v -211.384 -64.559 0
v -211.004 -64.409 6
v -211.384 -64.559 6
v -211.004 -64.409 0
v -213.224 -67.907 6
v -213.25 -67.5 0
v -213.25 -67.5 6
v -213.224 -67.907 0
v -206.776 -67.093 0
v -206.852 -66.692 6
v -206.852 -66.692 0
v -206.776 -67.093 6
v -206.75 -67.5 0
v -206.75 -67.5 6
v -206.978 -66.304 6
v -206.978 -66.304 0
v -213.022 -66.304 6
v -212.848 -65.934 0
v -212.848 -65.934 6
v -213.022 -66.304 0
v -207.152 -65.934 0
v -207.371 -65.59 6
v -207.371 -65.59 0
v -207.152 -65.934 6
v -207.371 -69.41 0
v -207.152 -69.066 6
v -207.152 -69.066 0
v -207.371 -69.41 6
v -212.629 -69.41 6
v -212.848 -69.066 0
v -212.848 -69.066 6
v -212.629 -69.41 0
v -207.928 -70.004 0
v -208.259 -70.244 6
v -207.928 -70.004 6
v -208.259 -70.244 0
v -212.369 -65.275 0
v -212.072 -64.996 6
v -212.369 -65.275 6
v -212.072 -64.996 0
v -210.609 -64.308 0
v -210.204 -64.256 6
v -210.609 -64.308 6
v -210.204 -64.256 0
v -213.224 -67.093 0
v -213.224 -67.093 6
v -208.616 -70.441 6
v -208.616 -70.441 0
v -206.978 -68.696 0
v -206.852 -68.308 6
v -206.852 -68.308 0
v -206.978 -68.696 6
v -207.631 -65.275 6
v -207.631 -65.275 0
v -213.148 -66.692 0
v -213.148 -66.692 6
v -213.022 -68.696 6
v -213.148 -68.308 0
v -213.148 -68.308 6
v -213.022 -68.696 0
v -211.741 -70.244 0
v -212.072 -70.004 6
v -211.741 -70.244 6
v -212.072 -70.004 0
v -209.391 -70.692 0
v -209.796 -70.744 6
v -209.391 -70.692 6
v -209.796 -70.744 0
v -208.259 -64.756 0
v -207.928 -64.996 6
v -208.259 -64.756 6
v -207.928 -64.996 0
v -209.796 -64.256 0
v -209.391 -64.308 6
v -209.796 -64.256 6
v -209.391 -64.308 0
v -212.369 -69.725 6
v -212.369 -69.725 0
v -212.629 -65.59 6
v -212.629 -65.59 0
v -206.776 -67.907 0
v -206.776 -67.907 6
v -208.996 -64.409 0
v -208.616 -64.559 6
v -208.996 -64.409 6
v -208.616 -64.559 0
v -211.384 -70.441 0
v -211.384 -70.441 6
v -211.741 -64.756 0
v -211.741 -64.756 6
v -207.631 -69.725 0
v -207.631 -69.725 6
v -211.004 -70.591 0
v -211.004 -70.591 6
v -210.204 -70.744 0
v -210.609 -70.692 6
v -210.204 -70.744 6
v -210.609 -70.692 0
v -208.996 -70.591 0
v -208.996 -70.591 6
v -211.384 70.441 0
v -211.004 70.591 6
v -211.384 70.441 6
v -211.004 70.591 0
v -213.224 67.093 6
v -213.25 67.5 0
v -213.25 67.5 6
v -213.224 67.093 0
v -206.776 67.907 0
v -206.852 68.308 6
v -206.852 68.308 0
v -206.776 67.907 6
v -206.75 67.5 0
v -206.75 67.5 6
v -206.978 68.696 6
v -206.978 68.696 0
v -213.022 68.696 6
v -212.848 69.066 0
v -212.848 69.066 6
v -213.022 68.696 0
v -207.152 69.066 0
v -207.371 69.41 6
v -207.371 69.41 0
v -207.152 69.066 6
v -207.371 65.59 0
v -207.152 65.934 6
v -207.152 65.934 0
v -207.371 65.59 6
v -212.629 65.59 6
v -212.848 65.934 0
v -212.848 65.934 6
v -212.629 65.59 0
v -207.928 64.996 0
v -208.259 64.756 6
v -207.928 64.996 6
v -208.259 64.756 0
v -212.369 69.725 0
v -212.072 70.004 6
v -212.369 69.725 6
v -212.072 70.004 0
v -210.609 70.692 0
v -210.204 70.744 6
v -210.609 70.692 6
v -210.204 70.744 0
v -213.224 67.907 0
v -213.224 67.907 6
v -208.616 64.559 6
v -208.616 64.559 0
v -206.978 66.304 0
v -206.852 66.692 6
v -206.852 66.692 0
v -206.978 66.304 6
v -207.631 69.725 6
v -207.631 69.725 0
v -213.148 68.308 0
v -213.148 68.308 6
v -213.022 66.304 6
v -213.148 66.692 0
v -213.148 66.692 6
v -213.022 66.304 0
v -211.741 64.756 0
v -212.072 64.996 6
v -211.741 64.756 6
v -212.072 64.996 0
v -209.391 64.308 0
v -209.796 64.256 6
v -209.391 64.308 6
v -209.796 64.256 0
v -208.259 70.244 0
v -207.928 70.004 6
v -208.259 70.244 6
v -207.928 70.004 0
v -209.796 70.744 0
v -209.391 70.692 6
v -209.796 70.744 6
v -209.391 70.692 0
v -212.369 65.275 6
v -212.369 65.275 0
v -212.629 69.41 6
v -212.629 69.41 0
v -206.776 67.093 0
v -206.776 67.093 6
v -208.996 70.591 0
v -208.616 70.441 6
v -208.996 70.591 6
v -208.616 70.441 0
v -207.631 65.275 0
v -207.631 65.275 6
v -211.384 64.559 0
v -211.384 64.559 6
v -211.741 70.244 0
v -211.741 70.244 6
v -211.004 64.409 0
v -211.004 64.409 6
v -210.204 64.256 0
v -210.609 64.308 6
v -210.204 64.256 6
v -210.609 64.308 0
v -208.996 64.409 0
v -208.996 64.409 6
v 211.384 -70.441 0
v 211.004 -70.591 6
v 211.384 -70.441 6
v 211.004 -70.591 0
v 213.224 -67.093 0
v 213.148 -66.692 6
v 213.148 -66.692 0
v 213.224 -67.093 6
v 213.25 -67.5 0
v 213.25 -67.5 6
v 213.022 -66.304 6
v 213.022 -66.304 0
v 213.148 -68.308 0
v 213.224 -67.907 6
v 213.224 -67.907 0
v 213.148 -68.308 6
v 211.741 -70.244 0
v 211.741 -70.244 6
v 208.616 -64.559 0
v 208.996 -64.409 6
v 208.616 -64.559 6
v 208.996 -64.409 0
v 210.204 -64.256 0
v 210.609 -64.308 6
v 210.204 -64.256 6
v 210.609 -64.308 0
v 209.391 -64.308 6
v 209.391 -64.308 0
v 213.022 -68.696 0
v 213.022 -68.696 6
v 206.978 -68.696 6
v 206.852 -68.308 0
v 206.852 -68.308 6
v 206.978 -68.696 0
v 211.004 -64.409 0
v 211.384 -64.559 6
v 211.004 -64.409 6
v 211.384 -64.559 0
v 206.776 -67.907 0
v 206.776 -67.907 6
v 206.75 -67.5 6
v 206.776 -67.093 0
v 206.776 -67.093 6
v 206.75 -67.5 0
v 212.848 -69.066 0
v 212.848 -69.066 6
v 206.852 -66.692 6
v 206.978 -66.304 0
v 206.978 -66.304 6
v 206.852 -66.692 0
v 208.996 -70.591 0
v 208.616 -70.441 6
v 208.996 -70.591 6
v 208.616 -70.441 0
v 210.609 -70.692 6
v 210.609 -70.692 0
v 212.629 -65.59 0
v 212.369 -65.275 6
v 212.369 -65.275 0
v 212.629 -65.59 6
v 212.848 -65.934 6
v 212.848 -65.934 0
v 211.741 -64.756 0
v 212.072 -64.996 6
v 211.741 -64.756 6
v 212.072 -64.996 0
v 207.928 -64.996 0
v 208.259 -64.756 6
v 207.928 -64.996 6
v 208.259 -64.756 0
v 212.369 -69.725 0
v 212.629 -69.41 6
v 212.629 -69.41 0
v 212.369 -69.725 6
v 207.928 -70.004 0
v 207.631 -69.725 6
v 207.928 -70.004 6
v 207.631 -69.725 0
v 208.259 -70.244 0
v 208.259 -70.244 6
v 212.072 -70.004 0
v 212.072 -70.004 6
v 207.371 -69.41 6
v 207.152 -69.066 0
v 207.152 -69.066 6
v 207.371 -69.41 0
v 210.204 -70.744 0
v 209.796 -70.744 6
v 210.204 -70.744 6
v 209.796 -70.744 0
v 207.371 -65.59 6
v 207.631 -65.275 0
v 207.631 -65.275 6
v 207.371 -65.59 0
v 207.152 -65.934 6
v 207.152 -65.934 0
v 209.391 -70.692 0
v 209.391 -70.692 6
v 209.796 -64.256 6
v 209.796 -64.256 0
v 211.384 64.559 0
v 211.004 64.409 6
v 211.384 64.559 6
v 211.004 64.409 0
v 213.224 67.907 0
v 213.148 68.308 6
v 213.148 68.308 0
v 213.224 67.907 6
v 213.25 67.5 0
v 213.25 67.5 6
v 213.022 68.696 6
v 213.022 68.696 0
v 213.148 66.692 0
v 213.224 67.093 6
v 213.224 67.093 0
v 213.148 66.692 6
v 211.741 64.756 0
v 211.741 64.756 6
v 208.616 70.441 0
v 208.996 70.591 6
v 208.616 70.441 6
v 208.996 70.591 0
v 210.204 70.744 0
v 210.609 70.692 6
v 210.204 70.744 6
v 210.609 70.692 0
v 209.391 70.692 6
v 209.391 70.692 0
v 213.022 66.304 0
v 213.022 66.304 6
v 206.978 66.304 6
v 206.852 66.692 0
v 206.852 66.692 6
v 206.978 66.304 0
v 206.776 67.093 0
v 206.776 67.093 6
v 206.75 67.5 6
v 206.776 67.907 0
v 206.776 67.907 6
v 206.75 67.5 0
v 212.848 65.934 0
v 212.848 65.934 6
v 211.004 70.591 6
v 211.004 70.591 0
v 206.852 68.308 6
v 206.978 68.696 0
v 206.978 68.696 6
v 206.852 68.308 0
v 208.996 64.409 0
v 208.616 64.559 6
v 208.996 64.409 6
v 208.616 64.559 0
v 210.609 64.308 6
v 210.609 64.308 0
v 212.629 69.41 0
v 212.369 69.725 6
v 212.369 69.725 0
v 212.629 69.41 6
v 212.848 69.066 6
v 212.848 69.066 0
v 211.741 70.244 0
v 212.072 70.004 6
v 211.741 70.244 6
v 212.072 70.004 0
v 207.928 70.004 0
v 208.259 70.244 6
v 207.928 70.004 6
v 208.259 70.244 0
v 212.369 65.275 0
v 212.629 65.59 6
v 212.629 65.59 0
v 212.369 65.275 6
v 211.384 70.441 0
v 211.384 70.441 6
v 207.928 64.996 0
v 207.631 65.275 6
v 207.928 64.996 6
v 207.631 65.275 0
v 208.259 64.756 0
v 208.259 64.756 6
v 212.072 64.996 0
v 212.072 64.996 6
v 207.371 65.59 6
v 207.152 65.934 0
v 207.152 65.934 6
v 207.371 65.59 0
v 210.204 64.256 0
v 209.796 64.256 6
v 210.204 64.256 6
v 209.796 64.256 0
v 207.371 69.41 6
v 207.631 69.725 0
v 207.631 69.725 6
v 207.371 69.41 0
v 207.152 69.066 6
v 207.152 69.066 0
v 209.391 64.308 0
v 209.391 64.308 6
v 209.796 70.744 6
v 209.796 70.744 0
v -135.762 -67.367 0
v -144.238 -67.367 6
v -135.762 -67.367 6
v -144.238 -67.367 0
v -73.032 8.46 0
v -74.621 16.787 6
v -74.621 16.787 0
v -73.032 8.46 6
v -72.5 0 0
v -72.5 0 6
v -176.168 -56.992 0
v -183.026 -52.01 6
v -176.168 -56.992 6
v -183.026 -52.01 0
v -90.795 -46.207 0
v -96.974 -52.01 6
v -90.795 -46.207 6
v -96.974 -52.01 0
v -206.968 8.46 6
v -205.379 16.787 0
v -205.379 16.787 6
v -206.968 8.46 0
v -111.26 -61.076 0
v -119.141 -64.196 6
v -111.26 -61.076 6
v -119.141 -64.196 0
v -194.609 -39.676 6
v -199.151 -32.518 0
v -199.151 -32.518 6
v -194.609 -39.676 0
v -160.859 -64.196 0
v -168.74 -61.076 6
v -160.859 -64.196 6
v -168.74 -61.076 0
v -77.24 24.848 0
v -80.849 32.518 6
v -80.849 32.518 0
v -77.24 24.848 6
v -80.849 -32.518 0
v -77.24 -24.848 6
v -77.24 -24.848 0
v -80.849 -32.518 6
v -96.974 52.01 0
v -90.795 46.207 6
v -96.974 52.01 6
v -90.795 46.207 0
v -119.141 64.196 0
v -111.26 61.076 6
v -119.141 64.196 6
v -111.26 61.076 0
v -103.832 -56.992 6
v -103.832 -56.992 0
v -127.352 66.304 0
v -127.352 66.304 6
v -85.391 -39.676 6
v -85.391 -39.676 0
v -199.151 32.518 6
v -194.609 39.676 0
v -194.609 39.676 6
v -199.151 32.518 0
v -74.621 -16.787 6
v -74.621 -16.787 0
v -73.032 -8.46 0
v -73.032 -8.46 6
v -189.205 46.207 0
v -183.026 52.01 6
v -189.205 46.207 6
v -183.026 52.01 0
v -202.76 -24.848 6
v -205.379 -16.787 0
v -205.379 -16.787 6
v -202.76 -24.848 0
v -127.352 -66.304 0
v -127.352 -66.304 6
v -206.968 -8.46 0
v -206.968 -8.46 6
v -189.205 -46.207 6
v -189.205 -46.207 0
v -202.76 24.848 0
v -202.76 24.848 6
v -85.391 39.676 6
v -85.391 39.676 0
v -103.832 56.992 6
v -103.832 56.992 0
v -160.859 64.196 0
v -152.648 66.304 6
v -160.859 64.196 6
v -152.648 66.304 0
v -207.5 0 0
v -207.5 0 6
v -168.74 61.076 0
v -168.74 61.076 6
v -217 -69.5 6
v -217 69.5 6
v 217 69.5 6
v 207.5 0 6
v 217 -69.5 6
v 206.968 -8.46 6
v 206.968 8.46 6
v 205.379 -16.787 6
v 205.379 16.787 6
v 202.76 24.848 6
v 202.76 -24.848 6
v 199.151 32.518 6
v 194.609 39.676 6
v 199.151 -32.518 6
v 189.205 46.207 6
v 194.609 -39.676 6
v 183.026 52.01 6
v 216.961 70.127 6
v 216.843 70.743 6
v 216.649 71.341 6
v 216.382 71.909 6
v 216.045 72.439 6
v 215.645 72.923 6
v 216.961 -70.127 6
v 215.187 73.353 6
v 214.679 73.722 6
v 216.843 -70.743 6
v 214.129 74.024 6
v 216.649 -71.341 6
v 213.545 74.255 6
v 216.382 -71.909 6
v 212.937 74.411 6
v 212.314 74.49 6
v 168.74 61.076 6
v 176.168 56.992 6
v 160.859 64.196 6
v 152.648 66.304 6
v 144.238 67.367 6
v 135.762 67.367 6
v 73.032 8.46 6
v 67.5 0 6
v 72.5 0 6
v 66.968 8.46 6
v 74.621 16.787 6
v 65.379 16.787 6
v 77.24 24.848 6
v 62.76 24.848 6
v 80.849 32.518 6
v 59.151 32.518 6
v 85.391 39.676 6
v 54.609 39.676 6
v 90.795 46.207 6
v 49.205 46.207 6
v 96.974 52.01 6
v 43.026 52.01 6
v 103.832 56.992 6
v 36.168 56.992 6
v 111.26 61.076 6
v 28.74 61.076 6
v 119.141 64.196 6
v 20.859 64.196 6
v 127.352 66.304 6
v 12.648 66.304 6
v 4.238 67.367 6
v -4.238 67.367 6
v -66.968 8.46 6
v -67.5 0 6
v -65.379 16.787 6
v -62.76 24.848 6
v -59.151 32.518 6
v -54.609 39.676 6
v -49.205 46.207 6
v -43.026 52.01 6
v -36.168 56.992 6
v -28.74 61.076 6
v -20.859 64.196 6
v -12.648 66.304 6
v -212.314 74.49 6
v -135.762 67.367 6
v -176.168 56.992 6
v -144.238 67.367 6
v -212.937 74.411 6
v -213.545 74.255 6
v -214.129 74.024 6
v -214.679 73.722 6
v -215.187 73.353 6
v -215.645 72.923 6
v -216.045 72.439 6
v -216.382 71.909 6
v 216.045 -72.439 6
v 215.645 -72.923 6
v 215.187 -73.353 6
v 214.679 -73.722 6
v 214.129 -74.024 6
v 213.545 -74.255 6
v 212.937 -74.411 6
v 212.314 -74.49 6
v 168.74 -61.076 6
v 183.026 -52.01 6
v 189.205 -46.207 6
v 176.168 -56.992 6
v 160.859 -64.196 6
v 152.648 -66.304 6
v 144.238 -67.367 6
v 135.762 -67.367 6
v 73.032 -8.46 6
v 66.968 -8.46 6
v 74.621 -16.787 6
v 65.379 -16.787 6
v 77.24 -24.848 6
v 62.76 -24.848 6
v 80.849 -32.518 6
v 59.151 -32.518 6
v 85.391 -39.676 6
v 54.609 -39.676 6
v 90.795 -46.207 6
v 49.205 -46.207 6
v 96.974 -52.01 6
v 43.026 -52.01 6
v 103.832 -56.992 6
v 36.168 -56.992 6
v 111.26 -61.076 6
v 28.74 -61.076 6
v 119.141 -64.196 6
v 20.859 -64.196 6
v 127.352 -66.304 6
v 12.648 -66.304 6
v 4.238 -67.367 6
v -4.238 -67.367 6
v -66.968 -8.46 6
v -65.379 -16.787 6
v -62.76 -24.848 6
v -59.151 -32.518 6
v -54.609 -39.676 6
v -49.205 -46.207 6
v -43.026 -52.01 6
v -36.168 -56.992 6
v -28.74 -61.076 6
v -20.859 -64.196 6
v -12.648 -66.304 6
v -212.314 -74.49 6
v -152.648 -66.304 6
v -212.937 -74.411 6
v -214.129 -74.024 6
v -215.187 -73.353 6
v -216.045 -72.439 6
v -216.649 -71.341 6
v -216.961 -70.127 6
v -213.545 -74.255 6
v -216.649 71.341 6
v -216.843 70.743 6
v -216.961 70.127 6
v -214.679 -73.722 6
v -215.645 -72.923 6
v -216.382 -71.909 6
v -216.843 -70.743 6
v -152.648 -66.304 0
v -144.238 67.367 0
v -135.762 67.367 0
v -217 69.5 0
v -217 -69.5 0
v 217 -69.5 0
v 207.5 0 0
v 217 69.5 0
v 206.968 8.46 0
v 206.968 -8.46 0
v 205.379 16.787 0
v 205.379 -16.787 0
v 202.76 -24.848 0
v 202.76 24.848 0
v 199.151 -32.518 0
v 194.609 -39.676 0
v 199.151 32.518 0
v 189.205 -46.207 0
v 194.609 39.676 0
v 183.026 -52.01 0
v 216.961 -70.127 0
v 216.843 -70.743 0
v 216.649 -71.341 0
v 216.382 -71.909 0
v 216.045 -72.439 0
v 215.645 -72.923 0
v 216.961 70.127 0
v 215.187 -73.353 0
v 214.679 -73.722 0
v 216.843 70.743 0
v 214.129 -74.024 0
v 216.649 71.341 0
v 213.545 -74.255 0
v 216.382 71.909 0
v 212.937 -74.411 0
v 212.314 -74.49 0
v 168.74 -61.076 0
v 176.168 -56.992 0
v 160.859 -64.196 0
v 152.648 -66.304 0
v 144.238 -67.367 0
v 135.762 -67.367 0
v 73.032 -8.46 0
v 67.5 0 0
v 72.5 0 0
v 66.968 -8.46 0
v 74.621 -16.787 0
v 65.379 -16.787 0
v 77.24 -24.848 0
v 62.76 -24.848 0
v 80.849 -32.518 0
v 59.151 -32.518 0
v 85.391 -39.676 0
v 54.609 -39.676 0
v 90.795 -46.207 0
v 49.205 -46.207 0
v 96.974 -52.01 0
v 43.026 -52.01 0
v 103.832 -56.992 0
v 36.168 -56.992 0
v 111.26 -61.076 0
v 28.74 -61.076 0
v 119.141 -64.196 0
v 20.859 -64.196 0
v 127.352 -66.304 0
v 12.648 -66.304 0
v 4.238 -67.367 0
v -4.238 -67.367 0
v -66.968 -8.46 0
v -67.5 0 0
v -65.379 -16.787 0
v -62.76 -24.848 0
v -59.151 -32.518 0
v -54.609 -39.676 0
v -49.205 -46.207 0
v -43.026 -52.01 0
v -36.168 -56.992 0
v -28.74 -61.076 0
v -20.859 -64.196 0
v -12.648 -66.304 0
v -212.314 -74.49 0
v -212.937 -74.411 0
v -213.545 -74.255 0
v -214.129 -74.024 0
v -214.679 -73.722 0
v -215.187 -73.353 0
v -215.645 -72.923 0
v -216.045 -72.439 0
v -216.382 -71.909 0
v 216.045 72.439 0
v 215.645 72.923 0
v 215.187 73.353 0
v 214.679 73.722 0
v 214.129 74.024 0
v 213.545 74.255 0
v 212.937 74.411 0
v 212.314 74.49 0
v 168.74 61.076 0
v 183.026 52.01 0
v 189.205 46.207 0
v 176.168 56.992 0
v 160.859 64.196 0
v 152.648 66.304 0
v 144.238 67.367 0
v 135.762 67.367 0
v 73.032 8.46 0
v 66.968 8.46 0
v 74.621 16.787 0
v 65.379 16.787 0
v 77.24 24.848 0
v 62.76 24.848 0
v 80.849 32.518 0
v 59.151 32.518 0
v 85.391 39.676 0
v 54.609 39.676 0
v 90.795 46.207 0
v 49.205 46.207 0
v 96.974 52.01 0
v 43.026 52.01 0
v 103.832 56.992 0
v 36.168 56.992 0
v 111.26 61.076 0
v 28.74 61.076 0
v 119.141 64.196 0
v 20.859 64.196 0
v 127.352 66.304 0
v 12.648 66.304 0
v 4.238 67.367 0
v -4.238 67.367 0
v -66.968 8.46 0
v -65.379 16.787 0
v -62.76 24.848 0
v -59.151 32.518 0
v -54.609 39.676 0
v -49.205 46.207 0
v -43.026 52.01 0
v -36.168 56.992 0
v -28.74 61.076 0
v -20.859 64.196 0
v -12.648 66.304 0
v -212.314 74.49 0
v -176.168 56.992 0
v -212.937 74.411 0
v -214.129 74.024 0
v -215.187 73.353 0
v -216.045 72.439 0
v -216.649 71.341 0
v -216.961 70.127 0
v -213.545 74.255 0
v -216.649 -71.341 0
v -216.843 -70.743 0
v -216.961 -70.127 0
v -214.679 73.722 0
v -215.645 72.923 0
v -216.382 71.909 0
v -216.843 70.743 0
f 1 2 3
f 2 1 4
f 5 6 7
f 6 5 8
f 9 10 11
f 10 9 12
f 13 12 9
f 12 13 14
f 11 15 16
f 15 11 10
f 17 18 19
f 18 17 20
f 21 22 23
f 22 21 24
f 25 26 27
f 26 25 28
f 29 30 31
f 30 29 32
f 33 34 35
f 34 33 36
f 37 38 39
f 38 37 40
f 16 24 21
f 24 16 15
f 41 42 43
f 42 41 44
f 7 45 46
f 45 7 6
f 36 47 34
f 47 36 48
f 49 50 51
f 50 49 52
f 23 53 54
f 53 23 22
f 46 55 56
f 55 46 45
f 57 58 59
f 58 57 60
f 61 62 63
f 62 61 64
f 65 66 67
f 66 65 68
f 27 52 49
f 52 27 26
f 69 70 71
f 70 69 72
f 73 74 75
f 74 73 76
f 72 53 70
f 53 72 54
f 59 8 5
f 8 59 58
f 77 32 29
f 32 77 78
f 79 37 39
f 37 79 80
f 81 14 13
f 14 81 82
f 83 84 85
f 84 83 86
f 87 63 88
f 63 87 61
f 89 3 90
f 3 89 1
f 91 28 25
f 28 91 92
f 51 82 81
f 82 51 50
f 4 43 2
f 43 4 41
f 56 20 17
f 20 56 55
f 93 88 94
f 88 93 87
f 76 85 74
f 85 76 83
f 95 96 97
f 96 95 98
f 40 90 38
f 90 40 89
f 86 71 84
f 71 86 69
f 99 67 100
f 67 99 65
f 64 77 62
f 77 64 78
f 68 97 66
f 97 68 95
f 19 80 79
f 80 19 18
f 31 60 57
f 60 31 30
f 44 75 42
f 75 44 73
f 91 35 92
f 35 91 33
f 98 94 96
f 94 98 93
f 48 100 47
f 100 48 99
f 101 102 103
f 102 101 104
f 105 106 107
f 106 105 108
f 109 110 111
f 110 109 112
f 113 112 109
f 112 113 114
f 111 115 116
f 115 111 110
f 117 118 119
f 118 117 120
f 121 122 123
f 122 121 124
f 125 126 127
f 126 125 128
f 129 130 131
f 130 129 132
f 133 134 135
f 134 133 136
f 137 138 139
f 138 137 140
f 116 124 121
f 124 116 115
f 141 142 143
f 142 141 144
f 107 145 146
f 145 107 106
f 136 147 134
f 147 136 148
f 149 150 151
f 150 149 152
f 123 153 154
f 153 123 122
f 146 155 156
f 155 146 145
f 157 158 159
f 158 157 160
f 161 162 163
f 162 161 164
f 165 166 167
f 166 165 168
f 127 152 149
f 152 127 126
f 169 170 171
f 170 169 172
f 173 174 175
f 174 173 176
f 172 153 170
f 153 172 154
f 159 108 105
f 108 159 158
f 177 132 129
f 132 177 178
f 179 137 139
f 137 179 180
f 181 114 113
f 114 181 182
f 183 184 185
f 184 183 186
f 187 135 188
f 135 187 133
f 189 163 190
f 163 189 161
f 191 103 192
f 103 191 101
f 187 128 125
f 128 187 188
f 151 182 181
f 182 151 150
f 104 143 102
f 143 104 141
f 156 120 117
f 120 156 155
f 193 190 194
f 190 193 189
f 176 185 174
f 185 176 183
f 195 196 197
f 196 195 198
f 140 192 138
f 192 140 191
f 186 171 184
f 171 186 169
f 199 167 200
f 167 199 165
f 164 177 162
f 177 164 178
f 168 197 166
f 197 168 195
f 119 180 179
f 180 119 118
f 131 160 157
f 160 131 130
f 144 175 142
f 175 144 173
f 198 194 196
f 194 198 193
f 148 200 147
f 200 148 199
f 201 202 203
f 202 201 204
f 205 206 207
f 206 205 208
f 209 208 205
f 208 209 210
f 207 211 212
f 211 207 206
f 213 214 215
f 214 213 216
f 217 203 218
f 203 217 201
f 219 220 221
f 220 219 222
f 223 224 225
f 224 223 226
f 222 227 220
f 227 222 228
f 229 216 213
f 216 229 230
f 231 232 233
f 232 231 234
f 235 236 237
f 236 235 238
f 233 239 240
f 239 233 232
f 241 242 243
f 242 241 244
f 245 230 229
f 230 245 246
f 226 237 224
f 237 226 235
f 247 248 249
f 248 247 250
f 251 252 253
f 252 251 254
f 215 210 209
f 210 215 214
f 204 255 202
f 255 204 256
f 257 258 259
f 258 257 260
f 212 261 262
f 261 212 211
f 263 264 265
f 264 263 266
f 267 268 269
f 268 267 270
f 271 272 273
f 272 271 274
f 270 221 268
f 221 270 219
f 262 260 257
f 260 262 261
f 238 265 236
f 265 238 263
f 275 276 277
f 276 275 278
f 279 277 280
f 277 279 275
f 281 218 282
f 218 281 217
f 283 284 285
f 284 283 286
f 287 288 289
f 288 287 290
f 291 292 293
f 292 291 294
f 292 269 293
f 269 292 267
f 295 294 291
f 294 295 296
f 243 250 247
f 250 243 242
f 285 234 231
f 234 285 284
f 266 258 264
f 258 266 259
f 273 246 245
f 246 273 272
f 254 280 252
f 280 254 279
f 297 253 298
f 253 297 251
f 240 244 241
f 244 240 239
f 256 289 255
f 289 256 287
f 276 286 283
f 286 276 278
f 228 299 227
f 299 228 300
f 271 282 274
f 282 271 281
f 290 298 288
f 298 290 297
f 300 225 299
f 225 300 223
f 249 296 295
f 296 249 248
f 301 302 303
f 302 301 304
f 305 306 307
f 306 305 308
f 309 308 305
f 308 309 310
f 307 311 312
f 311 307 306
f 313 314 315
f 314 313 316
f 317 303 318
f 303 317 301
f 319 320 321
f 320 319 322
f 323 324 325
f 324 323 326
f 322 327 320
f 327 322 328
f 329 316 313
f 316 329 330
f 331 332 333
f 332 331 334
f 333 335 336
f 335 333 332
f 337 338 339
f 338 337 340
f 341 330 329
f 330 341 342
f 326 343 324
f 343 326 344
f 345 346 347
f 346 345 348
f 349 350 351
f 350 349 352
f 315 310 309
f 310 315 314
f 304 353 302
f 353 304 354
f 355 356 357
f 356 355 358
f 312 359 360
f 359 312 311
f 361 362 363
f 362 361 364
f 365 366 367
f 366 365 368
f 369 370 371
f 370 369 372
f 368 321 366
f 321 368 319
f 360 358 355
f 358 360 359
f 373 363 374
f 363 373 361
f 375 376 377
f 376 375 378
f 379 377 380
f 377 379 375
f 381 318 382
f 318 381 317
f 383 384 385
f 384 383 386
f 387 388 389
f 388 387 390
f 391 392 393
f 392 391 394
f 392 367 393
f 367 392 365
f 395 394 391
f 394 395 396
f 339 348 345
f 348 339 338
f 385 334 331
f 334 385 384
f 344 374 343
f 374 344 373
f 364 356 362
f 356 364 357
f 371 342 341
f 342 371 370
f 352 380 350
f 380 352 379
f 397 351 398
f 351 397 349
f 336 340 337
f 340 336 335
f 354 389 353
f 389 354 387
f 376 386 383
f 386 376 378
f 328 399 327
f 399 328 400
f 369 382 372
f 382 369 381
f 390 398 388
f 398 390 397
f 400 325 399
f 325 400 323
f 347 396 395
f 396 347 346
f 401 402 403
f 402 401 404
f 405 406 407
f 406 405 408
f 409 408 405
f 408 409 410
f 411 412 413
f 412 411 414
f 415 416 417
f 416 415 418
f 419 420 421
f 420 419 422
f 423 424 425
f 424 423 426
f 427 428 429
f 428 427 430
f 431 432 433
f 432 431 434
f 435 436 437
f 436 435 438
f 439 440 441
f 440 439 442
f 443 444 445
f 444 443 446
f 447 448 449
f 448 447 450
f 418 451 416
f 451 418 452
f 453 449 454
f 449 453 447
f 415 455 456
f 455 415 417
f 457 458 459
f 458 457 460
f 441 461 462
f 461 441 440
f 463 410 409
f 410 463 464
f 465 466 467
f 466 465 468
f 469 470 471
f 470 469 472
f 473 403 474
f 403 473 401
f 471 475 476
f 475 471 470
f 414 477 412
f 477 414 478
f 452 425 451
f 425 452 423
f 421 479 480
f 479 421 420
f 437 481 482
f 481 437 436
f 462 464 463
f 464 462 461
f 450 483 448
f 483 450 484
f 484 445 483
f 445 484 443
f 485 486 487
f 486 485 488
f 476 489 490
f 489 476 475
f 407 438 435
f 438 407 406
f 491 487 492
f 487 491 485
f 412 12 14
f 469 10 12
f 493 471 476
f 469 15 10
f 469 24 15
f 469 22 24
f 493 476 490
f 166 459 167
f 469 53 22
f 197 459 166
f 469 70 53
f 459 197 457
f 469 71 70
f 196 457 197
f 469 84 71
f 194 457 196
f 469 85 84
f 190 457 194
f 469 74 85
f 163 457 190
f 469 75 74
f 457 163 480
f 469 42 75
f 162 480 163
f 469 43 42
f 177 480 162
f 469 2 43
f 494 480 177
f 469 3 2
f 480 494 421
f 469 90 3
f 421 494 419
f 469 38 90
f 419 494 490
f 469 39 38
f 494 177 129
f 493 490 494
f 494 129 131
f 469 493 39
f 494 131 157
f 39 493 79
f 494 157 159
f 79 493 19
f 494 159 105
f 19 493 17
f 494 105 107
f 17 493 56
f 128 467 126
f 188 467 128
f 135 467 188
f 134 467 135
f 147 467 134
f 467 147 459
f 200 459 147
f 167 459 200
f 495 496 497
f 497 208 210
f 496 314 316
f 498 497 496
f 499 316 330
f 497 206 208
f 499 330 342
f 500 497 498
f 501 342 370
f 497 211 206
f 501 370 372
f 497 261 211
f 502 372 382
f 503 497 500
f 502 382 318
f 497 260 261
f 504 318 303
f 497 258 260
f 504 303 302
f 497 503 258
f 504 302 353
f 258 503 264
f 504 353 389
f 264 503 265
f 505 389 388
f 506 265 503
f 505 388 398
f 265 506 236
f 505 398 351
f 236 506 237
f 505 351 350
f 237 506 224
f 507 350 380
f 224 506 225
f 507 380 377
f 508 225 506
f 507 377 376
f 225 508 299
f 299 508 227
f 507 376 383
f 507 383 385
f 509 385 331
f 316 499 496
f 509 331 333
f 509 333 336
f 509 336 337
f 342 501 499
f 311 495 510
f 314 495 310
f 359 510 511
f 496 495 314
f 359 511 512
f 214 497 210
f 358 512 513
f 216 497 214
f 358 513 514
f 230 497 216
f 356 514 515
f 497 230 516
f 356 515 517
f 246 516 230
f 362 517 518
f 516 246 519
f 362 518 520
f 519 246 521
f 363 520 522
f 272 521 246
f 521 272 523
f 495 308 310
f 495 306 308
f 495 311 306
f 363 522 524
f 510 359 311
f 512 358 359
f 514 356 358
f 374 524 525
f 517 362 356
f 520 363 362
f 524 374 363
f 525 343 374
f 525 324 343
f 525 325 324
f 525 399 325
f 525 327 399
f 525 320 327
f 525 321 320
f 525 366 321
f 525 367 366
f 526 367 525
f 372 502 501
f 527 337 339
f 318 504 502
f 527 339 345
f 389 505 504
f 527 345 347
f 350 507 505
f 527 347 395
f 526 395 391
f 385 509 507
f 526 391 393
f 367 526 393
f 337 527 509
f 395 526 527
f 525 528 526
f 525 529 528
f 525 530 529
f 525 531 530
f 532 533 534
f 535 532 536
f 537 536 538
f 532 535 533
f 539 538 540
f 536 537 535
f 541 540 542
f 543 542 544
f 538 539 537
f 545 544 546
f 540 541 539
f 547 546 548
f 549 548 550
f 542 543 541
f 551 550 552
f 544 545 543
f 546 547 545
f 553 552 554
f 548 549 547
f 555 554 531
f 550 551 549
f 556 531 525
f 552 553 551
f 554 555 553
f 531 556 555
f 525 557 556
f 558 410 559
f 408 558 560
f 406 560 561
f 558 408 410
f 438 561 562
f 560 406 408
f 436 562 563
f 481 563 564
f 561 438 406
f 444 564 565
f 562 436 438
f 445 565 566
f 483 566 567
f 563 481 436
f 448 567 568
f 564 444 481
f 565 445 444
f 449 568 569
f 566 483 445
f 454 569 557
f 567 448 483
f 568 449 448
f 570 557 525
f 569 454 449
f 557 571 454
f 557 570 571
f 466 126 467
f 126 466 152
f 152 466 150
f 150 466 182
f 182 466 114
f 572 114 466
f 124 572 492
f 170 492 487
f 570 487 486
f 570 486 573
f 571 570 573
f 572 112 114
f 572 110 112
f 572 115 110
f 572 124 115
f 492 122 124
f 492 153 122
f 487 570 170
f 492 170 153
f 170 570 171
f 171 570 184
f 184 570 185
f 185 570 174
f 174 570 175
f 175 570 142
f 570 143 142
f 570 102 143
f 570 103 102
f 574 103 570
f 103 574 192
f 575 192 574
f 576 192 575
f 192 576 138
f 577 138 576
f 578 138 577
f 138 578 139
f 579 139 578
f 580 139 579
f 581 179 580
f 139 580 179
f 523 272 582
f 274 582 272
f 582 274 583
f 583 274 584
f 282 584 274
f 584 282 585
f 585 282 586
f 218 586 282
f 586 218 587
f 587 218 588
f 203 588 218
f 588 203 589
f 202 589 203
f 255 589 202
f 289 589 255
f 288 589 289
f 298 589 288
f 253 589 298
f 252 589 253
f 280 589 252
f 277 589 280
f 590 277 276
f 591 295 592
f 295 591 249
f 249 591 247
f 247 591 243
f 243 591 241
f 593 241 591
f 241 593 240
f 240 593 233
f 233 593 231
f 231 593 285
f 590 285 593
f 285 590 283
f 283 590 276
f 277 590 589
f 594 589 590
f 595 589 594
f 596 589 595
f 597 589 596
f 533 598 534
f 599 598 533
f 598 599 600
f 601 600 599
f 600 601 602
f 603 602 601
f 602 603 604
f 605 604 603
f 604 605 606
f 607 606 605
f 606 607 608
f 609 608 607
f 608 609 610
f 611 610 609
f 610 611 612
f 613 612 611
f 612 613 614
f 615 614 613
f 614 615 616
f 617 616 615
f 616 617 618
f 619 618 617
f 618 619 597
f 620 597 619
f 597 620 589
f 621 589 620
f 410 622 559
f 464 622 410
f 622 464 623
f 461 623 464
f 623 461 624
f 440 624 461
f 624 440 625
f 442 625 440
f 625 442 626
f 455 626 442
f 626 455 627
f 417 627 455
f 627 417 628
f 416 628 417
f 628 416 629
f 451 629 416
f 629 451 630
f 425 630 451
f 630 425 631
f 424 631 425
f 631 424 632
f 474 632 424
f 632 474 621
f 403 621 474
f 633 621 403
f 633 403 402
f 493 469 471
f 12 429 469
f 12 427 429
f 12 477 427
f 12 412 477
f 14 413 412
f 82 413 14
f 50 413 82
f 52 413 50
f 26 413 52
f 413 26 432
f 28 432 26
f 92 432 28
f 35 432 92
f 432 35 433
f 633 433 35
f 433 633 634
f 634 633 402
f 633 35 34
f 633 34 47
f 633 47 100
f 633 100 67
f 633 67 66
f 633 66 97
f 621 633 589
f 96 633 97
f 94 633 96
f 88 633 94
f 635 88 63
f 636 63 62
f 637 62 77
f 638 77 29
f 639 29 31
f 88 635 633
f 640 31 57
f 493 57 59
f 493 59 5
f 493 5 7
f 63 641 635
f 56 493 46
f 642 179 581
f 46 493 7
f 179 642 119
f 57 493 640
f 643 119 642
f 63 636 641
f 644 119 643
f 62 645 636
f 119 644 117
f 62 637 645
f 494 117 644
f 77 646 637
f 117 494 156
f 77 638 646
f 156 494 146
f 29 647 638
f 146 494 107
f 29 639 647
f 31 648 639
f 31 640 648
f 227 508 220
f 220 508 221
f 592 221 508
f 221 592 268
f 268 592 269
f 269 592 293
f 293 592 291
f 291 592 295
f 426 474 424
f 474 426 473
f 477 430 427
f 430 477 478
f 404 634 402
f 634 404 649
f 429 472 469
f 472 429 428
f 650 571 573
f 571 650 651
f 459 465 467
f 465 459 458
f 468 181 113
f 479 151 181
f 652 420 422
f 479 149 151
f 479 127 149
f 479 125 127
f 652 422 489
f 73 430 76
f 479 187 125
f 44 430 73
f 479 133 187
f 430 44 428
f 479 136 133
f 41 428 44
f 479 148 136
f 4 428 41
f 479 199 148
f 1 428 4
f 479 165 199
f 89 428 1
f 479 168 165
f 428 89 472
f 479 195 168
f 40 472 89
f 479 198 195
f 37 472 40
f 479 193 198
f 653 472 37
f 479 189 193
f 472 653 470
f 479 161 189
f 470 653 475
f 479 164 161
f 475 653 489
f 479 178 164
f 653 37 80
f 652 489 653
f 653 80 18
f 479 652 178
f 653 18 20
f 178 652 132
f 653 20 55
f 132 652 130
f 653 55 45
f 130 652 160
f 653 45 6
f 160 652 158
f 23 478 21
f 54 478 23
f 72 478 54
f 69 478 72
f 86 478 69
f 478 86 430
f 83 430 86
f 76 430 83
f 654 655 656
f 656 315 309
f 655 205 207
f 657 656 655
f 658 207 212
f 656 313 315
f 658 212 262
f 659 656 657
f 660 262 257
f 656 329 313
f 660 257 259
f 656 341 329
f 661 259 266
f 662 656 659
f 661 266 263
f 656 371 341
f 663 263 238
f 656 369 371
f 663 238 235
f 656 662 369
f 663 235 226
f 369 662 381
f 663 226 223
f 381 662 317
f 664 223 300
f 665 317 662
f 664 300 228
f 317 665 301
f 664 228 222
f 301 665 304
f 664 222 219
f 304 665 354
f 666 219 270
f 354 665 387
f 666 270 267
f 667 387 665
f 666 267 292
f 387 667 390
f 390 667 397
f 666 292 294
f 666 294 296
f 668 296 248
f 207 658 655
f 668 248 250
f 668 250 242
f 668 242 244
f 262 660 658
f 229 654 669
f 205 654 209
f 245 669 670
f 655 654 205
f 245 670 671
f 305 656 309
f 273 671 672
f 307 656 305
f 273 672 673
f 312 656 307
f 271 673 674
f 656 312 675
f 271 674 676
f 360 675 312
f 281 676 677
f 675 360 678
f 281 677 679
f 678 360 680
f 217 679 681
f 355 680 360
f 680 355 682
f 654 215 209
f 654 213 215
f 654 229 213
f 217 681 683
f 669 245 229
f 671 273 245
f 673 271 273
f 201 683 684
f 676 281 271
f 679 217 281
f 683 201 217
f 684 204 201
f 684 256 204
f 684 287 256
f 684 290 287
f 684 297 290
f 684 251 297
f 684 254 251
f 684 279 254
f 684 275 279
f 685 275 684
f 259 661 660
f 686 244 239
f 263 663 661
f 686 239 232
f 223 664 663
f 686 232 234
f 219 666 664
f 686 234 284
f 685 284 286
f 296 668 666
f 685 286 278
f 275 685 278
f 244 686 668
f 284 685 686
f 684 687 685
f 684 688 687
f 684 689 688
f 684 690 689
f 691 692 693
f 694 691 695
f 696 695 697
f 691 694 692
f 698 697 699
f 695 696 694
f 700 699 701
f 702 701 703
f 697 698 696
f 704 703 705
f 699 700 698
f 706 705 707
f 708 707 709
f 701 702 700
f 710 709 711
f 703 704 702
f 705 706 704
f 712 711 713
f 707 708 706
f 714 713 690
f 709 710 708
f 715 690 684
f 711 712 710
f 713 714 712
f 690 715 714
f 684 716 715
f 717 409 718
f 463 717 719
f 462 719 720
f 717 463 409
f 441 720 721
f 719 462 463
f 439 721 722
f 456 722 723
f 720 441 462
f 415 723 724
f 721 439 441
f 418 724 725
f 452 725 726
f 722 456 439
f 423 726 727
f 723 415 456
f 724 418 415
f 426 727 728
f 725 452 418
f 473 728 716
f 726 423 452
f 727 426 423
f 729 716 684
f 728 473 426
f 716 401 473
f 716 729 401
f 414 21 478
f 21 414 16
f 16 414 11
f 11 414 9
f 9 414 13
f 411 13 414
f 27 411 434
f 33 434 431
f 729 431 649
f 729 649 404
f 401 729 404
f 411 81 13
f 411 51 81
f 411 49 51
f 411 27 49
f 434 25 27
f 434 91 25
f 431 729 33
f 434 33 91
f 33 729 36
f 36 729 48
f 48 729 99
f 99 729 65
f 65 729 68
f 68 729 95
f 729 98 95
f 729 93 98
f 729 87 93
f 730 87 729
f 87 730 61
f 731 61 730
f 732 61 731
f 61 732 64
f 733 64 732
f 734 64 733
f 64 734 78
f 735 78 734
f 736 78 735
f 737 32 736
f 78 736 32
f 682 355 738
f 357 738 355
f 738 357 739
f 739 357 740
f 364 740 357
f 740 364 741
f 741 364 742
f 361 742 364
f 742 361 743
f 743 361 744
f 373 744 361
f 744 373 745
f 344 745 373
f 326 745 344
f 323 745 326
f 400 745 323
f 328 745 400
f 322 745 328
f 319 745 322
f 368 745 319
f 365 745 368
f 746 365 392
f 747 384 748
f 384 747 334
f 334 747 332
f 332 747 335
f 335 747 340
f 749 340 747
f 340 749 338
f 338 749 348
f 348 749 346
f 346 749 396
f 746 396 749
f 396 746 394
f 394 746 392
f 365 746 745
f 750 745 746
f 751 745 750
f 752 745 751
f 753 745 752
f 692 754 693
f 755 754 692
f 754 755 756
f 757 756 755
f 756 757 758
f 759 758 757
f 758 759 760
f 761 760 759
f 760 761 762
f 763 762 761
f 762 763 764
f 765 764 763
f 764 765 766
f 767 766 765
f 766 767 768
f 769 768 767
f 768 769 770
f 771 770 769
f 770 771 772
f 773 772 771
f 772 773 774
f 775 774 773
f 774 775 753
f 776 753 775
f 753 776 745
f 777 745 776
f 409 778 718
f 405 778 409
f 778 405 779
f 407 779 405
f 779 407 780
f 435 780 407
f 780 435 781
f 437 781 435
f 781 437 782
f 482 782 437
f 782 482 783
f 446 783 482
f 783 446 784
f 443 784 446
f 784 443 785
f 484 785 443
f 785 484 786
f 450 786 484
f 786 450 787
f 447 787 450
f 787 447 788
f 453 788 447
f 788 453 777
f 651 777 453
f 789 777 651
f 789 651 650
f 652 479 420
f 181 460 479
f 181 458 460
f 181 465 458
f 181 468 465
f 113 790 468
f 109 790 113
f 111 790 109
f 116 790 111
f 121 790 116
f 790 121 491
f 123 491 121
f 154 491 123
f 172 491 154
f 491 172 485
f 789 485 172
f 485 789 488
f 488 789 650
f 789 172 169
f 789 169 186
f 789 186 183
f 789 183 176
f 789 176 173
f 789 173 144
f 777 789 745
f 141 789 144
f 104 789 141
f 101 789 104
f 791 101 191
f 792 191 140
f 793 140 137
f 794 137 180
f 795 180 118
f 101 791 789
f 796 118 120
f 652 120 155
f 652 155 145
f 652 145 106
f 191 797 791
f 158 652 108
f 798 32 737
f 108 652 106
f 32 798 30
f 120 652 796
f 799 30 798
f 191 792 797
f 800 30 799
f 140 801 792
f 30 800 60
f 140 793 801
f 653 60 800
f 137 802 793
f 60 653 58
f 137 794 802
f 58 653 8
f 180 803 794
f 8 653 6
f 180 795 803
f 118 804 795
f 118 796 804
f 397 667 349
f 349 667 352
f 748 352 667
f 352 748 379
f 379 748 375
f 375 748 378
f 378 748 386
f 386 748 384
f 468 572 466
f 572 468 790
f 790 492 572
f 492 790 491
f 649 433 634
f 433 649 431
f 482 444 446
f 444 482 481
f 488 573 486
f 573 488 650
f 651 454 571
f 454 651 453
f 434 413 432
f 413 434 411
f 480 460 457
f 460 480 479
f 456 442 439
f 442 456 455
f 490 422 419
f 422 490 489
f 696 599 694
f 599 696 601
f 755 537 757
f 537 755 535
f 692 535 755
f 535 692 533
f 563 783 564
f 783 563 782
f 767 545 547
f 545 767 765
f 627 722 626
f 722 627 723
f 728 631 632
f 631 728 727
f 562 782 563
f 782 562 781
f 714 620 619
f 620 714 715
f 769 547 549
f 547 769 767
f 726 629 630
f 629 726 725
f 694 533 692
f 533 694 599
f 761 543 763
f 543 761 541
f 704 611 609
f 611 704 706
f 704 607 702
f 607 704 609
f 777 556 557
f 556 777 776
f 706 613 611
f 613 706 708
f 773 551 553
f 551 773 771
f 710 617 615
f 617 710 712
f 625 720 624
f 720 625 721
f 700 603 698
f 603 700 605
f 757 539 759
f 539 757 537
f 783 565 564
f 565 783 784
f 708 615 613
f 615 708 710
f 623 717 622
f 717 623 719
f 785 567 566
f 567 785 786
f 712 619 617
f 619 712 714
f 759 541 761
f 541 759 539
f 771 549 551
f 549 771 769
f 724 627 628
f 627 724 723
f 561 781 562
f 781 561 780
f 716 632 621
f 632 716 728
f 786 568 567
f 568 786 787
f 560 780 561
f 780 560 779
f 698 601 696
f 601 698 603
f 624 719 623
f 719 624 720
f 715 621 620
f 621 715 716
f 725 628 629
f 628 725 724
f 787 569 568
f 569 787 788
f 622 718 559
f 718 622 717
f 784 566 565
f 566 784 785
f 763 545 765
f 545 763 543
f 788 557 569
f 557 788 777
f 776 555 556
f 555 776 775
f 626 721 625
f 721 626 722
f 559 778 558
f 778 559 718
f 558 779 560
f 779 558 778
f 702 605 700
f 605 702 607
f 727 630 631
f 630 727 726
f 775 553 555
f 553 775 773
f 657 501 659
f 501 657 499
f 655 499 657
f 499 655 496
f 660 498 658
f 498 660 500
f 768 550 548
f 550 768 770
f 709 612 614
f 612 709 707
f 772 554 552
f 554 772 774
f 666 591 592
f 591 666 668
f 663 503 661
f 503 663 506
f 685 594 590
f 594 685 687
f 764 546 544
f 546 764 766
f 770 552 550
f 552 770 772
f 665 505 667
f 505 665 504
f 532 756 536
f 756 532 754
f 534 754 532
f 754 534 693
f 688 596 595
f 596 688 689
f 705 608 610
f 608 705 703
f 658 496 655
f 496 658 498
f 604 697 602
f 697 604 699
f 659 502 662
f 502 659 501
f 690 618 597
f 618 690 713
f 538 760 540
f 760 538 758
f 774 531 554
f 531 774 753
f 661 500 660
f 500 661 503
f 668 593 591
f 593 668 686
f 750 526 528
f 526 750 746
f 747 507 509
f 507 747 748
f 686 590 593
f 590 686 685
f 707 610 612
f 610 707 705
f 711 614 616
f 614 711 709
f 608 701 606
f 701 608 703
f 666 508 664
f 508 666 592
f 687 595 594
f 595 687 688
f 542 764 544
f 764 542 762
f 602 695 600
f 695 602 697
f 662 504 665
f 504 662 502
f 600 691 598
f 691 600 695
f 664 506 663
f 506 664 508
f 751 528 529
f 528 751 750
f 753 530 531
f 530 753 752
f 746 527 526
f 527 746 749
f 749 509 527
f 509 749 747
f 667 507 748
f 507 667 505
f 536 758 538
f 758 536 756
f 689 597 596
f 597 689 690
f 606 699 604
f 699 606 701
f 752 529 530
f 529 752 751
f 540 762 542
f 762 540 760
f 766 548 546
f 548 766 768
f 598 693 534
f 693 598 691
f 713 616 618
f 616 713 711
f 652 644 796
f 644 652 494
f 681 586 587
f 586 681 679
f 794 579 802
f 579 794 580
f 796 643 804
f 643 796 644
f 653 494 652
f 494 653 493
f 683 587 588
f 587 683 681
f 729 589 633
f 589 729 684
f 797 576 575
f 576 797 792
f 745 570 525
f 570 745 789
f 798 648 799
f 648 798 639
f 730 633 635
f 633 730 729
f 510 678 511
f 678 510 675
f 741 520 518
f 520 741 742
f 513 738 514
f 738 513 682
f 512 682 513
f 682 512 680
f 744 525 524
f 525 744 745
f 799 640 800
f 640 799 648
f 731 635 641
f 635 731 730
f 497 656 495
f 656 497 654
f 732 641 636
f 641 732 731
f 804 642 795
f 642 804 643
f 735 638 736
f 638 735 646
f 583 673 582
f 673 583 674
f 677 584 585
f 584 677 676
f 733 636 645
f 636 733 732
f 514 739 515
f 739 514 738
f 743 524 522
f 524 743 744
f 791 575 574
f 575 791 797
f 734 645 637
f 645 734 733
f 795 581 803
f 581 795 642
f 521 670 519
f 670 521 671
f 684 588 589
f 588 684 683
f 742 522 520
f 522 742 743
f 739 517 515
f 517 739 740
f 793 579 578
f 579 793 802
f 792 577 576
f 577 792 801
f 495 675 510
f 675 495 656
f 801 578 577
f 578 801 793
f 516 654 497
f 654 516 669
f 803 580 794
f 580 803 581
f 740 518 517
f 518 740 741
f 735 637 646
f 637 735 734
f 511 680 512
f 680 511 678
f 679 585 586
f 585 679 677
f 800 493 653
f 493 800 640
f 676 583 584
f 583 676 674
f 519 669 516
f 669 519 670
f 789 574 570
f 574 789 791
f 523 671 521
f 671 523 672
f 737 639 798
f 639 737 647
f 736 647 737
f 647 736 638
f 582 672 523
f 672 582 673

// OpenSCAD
$fn = 50;


difference() {
	union() {
		hull() {
			translate(v = [-212.0000000000, 69.5000000000, 0]) {
				cylinder(h = 6, r = 5);
			}
			translate(v = [212.0000000000, 69.5000000000, 0]) {
				cylinder(h = 6, r = 5);
			}
			translate(v = [-212.0000000000, -69.5000000000, 0]) {
				cylinder(h = 6, r = 5);
			}
			translate(v = [212.0000000000, -69.5000000000, 0]) {
				cylinder(h = 6, r = 5);
			}
		}
	}
	union() {
		#translate(v = [-210.0000000000, -67.5000000000, -100.0000000000]) {
			cylinder(h = 200, r = 3.2500000000);
		}
		#translate(v = [-210.0000000000, 67.5000000000, -100.0000000000]) {
			cylinder(h = 200, r = 3.2500000000);
		}
		#translate(v = [210.0000000000, -67.5000000000, -100.0000000000]) {
			cylinder(h = 200, r = 3.2500000000);
		}
		#translate(v = [210.0000000000, 67.5000000000, -100.0000000000]) {
			cylinder(h = 200, r = 3.2500000000);
		}
		#translate(v = [-140.0000000000, 0, 0]) {
			cylinder(h = 6, r = 67.5000000000);
		}
		#cylinder(h = 6, r = 67.5000000000);
		#translate(v = [140.0000000000, 0, 0]) {
			cylinder(h = 6, r = 67.5000000000);
		}
	}
}
